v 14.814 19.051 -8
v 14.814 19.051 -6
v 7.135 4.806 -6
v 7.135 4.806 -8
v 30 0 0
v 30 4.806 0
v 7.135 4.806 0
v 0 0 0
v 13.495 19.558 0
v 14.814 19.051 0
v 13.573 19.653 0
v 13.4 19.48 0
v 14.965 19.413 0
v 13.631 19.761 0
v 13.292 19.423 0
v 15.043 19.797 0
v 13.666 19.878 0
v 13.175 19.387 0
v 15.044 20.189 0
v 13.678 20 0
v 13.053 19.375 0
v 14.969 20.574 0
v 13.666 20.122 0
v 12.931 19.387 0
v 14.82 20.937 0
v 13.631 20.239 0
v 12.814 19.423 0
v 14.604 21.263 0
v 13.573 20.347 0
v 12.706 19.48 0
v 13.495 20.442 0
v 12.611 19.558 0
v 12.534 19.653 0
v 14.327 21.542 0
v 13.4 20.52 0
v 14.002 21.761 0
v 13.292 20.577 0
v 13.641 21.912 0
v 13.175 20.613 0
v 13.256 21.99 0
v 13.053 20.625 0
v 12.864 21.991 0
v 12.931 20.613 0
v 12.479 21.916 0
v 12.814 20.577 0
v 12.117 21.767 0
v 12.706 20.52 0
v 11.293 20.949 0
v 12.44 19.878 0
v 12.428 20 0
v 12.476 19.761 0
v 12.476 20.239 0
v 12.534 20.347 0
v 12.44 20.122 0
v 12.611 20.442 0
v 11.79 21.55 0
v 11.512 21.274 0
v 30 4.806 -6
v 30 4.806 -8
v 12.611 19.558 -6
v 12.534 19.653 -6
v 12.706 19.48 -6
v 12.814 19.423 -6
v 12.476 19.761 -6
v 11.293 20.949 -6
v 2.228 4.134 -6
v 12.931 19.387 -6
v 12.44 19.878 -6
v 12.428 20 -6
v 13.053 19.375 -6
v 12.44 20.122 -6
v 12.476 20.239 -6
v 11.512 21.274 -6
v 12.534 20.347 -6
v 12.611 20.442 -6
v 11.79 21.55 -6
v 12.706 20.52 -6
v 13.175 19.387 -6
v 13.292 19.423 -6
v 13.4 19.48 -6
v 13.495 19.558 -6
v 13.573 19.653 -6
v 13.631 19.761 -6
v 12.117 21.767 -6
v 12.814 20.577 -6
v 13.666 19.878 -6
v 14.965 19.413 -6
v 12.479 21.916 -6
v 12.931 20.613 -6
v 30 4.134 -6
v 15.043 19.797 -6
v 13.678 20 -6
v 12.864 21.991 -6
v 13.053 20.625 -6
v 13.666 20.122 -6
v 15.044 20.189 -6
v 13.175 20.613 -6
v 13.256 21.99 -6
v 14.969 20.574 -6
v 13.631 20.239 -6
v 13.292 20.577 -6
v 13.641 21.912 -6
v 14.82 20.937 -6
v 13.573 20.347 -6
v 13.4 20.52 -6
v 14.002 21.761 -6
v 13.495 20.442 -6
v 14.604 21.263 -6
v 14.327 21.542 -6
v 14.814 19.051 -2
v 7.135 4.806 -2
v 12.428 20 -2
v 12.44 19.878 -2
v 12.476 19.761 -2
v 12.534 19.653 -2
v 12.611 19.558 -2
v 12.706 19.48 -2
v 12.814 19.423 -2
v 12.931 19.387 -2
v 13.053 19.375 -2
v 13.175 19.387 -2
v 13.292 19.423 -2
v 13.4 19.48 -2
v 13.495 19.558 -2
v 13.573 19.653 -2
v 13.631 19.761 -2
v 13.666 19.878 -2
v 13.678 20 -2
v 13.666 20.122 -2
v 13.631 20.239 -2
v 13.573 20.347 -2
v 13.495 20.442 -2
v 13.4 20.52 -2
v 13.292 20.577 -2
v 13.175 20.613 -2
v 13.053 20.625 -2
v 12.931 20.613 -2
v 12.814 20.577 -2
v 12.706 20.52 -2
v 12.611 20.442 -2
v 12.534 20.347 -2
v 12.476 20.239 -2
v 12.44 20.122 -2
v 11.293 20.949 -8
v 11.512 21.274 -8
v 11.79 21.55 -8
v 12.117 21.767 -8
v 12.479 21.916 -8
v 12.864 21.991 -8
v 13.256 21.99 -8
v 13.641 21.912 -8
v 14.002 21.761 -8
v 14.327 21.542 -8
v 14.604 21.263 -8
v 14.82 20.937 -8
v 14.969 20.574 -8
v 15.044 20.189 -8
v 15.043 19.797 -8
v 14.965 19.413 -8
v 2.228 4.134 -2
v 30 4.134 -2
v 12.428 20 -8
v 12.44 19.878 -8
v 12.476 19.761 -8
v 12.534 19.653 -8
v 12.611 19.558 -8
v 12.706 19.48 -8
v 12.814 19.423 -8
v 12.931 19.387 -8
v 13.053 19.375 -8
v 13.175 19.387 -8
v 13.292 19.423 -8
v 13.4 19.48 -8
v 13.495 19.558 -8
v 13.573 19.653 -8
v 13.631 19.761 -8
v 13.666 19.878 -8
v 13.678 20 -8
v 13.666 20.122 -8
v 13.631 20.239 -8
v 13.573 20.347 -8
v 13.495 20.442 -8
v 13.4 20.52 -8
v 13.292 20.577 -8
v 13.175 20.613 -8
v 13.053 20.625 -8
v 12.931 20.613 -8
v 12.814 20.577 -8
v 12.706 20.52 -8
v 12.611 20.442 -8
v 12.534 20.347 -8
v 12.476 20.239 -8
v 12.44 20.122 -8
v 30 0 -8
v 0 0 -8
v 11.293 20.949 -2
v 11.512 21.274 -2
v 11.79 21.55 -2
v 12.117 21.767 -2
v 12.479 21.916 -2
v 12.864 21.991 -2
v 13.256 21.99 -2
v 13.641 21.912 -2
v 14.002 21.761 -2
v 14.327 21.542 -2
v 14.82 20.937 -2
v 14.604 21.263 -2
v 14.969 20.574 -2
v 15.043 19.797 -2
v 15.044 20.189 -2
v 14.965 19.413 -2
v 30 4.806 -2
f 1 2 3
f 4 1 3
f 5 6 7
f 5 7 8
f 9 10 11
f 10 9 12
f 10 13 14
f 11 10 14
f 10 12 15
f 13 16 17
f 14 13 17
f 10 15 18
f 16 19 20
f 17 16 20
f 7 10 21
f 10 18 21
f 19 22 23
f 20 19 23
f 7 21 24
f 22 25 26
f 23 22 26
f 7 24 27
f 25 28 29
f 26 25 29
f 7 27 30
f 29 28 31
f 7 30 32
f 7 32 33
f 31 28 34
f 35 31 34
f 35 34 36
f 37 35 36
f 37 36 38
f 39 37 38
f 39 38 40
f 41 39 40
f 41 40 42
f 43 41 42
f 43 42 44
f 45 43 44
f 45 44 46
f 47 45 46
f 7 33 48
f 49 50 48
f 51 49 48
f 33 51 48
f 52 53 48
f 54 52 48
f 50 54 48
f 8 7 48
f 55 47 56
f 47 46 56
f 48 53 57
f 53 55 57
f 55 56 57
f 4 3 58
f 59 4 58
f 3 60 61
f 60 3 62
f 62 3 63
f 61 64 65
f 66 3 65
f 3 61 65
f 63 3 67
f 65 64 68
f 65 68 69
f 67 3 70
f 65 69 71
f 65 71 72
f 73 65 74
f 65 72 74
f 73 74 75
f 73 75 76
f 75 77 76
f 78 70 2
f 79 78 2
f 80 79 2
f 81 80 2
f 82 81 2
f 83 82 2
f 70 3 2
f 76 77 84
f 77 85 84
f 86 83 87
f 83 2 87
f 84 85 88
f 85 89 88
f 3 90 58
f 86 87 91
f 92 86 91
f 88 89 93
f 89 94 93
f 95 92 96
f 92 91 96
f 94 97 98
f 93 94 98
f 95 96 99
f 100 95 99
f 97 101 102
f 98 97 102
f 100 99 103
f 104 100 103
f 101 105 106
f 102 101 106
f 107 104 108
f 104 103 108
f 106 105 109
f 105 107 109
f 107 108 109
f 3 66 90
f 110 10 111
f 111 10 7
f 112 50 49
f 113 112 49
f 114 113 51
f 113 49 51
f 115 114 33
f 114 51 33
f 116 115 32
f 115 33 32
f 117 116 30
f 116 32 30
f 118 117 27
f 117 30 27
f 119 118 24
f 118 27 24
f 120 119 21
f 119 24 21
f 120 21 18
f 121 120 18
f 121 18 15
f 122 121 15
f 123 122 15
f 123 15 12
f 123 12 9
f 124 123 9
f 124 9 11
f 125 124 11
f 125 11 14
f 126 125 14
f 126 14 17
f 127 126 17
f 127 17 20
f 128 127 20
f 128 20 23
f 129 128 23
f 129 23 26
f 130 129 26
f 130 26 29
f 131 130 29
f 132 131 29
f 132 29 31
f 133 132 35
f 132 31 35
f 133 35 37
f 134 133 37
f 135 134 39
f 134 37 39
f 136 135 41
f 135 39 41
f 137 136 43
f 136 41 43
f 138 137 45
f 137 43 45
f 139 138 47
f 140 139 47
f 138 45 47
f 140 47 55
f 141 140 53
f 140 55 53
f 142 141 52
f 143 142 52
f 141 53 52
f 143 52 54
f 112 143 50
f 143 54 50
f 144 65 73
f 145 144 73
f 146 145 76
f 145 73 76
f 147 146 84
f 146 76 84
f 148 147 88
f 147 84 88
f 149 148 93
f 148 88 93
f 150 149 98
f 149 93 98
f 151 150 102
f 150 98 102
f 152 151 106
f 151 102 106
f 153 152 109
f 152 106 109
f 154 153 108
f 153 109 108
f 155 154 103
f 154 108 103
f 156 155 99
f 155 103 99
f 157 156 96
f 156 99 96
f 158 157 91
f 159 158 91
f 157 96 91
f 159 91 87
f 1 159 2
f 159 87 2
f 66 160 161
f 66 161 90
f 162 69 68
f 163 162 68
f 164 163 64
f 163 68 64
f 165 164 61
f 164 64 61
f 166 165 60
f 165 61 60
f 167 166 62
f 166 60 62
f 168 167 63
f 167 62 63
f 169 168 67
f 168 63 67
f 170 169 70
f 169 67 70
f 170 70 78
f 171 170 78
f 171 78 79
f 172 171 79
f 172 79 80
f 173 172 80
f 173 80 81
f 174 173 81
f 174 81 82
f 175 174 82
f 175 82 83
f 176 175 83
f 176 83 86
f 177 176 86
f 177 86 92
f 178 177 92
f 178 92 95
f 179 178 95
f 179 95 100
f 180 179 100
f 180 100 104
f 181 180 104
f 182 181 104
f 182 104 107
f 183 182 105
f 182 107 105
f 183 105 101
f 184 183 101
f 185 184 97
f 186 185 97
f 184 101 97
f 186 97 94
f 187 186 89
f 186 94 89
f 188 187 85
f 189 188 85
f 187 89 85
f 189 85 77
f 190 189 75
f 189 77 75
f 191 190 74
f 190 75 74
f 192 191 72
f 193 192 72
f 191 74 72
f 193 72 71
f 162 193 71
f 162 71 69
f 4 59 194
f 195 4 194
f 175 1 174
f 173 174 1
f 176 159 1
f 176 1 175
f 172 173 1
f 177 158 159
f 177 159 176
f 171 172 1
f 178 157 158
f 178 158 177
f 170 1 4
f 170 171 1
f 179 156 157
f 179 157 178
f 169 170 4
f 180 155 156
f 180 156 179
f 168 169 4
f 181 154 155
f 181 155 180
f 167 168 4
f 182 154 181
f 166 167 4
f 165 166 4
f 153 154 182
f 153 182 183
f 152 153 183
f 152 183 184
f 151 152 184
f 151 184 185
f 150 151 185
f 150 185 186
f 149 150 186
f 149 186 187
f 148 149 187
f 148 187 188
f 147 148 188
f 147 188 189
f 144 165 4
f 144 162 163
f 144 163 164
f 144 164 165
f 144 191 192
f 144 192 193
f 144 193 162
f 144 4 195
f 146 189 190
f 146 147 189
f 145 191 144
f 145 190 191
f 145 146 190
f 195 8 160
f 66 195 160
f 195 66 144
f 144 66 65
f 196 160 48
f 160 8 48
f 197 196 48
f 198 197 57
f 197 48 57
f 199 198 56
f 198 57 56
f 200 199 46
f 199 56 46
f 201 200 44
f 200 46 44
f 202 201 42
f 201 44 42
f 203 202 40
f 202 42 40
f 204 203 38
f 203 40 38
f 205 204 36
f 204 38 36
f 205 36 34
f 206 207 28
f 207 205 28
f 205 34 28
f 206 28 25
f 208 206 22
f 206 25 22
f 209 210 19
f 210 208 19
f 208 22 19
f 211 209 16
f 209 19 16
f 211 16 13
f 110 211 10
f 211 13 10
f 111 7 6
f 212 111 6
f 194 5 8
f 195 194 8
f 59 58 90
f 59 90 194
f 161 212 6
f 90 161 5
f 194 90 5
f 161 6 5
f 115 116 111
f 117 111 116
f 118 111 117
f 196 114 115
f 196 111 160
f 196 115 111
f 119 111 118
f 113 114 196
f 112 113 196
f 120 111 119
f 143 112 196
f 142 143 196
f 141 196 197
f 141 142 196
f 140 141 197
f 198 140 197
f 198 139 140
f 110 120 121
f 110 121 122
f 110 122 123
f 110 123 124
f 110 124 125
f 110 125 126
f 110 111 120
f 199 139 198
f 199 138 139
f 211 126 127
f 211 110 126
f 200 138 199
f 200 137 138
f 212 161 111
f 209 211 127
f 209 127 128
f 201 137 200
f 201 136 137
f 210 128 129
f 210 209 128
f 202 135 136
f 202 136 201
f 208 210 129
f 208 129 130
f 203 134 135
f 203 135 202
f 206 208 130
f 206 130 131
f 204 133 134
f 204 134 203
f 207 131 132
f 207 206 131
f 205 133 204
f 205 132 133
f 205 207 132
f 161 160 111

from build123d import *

# Parameters (mm, degrees)
EXTRUDE_1_DEPTH     = 8
SKETCH_2_W          = 4
SKETCH_2_H          = 18.866305448
CUT_EXTRUDE_1_DEPTH = 88
SKETCH_3_R          = 0.625
CUT_EXTRUDE_2_DEPTH = 88


with BuildPart() as part:
    # 草圖1 → 填料-伸長1 (new body)
    with BuildSketch(Plane.XY):
        with BuildLine():
            Line((0, 0), (11.292732867, 20.94901356))
            ThreePointArc((11.292732867, 20.94901356), (14.002250122, 21.760503696), (14.813740258, 19.05098644))
            Line((14.813740258, 19.05098644), (7.13506975, 4.806376698))
            Line((7.13506975, 4.806376698), (30, 4.806376698))
            Line((30, 4.806376698), (30, 0))
            Line((30, 0), (0, 0))
        make_face()
    extrude(amount=-EXTRUDE_1_DEPTH)

    # 草圖2 → 除料-伸長1 (cut)
    with BuildSketch(Plane(origin=(30, 0, 0), x_dir=(0, 0, -1), z_dir=(1, 0, 0))):
        with Locations((4, 13.566847276)):
            Rectangle(SKETCH_2_W, SKETCH_2_H)
    extrude(amount=-CUT_EXTRUDE_1_DEPTH, mode=Mode.SUBTRACT)

    # 草圖3 → 除料-伸長2 (cut)
    with BuildSketch(Plane.XY):
        with Locations(Location((13.053236562, 20, 0), (0, 0, 180))):
            Circle(SKETCH_3_R)
    extrude(amount=-CUT_EXTRUDE_2_DEPTH, mode=Mode.SUBTRACT)


solid = part.part
